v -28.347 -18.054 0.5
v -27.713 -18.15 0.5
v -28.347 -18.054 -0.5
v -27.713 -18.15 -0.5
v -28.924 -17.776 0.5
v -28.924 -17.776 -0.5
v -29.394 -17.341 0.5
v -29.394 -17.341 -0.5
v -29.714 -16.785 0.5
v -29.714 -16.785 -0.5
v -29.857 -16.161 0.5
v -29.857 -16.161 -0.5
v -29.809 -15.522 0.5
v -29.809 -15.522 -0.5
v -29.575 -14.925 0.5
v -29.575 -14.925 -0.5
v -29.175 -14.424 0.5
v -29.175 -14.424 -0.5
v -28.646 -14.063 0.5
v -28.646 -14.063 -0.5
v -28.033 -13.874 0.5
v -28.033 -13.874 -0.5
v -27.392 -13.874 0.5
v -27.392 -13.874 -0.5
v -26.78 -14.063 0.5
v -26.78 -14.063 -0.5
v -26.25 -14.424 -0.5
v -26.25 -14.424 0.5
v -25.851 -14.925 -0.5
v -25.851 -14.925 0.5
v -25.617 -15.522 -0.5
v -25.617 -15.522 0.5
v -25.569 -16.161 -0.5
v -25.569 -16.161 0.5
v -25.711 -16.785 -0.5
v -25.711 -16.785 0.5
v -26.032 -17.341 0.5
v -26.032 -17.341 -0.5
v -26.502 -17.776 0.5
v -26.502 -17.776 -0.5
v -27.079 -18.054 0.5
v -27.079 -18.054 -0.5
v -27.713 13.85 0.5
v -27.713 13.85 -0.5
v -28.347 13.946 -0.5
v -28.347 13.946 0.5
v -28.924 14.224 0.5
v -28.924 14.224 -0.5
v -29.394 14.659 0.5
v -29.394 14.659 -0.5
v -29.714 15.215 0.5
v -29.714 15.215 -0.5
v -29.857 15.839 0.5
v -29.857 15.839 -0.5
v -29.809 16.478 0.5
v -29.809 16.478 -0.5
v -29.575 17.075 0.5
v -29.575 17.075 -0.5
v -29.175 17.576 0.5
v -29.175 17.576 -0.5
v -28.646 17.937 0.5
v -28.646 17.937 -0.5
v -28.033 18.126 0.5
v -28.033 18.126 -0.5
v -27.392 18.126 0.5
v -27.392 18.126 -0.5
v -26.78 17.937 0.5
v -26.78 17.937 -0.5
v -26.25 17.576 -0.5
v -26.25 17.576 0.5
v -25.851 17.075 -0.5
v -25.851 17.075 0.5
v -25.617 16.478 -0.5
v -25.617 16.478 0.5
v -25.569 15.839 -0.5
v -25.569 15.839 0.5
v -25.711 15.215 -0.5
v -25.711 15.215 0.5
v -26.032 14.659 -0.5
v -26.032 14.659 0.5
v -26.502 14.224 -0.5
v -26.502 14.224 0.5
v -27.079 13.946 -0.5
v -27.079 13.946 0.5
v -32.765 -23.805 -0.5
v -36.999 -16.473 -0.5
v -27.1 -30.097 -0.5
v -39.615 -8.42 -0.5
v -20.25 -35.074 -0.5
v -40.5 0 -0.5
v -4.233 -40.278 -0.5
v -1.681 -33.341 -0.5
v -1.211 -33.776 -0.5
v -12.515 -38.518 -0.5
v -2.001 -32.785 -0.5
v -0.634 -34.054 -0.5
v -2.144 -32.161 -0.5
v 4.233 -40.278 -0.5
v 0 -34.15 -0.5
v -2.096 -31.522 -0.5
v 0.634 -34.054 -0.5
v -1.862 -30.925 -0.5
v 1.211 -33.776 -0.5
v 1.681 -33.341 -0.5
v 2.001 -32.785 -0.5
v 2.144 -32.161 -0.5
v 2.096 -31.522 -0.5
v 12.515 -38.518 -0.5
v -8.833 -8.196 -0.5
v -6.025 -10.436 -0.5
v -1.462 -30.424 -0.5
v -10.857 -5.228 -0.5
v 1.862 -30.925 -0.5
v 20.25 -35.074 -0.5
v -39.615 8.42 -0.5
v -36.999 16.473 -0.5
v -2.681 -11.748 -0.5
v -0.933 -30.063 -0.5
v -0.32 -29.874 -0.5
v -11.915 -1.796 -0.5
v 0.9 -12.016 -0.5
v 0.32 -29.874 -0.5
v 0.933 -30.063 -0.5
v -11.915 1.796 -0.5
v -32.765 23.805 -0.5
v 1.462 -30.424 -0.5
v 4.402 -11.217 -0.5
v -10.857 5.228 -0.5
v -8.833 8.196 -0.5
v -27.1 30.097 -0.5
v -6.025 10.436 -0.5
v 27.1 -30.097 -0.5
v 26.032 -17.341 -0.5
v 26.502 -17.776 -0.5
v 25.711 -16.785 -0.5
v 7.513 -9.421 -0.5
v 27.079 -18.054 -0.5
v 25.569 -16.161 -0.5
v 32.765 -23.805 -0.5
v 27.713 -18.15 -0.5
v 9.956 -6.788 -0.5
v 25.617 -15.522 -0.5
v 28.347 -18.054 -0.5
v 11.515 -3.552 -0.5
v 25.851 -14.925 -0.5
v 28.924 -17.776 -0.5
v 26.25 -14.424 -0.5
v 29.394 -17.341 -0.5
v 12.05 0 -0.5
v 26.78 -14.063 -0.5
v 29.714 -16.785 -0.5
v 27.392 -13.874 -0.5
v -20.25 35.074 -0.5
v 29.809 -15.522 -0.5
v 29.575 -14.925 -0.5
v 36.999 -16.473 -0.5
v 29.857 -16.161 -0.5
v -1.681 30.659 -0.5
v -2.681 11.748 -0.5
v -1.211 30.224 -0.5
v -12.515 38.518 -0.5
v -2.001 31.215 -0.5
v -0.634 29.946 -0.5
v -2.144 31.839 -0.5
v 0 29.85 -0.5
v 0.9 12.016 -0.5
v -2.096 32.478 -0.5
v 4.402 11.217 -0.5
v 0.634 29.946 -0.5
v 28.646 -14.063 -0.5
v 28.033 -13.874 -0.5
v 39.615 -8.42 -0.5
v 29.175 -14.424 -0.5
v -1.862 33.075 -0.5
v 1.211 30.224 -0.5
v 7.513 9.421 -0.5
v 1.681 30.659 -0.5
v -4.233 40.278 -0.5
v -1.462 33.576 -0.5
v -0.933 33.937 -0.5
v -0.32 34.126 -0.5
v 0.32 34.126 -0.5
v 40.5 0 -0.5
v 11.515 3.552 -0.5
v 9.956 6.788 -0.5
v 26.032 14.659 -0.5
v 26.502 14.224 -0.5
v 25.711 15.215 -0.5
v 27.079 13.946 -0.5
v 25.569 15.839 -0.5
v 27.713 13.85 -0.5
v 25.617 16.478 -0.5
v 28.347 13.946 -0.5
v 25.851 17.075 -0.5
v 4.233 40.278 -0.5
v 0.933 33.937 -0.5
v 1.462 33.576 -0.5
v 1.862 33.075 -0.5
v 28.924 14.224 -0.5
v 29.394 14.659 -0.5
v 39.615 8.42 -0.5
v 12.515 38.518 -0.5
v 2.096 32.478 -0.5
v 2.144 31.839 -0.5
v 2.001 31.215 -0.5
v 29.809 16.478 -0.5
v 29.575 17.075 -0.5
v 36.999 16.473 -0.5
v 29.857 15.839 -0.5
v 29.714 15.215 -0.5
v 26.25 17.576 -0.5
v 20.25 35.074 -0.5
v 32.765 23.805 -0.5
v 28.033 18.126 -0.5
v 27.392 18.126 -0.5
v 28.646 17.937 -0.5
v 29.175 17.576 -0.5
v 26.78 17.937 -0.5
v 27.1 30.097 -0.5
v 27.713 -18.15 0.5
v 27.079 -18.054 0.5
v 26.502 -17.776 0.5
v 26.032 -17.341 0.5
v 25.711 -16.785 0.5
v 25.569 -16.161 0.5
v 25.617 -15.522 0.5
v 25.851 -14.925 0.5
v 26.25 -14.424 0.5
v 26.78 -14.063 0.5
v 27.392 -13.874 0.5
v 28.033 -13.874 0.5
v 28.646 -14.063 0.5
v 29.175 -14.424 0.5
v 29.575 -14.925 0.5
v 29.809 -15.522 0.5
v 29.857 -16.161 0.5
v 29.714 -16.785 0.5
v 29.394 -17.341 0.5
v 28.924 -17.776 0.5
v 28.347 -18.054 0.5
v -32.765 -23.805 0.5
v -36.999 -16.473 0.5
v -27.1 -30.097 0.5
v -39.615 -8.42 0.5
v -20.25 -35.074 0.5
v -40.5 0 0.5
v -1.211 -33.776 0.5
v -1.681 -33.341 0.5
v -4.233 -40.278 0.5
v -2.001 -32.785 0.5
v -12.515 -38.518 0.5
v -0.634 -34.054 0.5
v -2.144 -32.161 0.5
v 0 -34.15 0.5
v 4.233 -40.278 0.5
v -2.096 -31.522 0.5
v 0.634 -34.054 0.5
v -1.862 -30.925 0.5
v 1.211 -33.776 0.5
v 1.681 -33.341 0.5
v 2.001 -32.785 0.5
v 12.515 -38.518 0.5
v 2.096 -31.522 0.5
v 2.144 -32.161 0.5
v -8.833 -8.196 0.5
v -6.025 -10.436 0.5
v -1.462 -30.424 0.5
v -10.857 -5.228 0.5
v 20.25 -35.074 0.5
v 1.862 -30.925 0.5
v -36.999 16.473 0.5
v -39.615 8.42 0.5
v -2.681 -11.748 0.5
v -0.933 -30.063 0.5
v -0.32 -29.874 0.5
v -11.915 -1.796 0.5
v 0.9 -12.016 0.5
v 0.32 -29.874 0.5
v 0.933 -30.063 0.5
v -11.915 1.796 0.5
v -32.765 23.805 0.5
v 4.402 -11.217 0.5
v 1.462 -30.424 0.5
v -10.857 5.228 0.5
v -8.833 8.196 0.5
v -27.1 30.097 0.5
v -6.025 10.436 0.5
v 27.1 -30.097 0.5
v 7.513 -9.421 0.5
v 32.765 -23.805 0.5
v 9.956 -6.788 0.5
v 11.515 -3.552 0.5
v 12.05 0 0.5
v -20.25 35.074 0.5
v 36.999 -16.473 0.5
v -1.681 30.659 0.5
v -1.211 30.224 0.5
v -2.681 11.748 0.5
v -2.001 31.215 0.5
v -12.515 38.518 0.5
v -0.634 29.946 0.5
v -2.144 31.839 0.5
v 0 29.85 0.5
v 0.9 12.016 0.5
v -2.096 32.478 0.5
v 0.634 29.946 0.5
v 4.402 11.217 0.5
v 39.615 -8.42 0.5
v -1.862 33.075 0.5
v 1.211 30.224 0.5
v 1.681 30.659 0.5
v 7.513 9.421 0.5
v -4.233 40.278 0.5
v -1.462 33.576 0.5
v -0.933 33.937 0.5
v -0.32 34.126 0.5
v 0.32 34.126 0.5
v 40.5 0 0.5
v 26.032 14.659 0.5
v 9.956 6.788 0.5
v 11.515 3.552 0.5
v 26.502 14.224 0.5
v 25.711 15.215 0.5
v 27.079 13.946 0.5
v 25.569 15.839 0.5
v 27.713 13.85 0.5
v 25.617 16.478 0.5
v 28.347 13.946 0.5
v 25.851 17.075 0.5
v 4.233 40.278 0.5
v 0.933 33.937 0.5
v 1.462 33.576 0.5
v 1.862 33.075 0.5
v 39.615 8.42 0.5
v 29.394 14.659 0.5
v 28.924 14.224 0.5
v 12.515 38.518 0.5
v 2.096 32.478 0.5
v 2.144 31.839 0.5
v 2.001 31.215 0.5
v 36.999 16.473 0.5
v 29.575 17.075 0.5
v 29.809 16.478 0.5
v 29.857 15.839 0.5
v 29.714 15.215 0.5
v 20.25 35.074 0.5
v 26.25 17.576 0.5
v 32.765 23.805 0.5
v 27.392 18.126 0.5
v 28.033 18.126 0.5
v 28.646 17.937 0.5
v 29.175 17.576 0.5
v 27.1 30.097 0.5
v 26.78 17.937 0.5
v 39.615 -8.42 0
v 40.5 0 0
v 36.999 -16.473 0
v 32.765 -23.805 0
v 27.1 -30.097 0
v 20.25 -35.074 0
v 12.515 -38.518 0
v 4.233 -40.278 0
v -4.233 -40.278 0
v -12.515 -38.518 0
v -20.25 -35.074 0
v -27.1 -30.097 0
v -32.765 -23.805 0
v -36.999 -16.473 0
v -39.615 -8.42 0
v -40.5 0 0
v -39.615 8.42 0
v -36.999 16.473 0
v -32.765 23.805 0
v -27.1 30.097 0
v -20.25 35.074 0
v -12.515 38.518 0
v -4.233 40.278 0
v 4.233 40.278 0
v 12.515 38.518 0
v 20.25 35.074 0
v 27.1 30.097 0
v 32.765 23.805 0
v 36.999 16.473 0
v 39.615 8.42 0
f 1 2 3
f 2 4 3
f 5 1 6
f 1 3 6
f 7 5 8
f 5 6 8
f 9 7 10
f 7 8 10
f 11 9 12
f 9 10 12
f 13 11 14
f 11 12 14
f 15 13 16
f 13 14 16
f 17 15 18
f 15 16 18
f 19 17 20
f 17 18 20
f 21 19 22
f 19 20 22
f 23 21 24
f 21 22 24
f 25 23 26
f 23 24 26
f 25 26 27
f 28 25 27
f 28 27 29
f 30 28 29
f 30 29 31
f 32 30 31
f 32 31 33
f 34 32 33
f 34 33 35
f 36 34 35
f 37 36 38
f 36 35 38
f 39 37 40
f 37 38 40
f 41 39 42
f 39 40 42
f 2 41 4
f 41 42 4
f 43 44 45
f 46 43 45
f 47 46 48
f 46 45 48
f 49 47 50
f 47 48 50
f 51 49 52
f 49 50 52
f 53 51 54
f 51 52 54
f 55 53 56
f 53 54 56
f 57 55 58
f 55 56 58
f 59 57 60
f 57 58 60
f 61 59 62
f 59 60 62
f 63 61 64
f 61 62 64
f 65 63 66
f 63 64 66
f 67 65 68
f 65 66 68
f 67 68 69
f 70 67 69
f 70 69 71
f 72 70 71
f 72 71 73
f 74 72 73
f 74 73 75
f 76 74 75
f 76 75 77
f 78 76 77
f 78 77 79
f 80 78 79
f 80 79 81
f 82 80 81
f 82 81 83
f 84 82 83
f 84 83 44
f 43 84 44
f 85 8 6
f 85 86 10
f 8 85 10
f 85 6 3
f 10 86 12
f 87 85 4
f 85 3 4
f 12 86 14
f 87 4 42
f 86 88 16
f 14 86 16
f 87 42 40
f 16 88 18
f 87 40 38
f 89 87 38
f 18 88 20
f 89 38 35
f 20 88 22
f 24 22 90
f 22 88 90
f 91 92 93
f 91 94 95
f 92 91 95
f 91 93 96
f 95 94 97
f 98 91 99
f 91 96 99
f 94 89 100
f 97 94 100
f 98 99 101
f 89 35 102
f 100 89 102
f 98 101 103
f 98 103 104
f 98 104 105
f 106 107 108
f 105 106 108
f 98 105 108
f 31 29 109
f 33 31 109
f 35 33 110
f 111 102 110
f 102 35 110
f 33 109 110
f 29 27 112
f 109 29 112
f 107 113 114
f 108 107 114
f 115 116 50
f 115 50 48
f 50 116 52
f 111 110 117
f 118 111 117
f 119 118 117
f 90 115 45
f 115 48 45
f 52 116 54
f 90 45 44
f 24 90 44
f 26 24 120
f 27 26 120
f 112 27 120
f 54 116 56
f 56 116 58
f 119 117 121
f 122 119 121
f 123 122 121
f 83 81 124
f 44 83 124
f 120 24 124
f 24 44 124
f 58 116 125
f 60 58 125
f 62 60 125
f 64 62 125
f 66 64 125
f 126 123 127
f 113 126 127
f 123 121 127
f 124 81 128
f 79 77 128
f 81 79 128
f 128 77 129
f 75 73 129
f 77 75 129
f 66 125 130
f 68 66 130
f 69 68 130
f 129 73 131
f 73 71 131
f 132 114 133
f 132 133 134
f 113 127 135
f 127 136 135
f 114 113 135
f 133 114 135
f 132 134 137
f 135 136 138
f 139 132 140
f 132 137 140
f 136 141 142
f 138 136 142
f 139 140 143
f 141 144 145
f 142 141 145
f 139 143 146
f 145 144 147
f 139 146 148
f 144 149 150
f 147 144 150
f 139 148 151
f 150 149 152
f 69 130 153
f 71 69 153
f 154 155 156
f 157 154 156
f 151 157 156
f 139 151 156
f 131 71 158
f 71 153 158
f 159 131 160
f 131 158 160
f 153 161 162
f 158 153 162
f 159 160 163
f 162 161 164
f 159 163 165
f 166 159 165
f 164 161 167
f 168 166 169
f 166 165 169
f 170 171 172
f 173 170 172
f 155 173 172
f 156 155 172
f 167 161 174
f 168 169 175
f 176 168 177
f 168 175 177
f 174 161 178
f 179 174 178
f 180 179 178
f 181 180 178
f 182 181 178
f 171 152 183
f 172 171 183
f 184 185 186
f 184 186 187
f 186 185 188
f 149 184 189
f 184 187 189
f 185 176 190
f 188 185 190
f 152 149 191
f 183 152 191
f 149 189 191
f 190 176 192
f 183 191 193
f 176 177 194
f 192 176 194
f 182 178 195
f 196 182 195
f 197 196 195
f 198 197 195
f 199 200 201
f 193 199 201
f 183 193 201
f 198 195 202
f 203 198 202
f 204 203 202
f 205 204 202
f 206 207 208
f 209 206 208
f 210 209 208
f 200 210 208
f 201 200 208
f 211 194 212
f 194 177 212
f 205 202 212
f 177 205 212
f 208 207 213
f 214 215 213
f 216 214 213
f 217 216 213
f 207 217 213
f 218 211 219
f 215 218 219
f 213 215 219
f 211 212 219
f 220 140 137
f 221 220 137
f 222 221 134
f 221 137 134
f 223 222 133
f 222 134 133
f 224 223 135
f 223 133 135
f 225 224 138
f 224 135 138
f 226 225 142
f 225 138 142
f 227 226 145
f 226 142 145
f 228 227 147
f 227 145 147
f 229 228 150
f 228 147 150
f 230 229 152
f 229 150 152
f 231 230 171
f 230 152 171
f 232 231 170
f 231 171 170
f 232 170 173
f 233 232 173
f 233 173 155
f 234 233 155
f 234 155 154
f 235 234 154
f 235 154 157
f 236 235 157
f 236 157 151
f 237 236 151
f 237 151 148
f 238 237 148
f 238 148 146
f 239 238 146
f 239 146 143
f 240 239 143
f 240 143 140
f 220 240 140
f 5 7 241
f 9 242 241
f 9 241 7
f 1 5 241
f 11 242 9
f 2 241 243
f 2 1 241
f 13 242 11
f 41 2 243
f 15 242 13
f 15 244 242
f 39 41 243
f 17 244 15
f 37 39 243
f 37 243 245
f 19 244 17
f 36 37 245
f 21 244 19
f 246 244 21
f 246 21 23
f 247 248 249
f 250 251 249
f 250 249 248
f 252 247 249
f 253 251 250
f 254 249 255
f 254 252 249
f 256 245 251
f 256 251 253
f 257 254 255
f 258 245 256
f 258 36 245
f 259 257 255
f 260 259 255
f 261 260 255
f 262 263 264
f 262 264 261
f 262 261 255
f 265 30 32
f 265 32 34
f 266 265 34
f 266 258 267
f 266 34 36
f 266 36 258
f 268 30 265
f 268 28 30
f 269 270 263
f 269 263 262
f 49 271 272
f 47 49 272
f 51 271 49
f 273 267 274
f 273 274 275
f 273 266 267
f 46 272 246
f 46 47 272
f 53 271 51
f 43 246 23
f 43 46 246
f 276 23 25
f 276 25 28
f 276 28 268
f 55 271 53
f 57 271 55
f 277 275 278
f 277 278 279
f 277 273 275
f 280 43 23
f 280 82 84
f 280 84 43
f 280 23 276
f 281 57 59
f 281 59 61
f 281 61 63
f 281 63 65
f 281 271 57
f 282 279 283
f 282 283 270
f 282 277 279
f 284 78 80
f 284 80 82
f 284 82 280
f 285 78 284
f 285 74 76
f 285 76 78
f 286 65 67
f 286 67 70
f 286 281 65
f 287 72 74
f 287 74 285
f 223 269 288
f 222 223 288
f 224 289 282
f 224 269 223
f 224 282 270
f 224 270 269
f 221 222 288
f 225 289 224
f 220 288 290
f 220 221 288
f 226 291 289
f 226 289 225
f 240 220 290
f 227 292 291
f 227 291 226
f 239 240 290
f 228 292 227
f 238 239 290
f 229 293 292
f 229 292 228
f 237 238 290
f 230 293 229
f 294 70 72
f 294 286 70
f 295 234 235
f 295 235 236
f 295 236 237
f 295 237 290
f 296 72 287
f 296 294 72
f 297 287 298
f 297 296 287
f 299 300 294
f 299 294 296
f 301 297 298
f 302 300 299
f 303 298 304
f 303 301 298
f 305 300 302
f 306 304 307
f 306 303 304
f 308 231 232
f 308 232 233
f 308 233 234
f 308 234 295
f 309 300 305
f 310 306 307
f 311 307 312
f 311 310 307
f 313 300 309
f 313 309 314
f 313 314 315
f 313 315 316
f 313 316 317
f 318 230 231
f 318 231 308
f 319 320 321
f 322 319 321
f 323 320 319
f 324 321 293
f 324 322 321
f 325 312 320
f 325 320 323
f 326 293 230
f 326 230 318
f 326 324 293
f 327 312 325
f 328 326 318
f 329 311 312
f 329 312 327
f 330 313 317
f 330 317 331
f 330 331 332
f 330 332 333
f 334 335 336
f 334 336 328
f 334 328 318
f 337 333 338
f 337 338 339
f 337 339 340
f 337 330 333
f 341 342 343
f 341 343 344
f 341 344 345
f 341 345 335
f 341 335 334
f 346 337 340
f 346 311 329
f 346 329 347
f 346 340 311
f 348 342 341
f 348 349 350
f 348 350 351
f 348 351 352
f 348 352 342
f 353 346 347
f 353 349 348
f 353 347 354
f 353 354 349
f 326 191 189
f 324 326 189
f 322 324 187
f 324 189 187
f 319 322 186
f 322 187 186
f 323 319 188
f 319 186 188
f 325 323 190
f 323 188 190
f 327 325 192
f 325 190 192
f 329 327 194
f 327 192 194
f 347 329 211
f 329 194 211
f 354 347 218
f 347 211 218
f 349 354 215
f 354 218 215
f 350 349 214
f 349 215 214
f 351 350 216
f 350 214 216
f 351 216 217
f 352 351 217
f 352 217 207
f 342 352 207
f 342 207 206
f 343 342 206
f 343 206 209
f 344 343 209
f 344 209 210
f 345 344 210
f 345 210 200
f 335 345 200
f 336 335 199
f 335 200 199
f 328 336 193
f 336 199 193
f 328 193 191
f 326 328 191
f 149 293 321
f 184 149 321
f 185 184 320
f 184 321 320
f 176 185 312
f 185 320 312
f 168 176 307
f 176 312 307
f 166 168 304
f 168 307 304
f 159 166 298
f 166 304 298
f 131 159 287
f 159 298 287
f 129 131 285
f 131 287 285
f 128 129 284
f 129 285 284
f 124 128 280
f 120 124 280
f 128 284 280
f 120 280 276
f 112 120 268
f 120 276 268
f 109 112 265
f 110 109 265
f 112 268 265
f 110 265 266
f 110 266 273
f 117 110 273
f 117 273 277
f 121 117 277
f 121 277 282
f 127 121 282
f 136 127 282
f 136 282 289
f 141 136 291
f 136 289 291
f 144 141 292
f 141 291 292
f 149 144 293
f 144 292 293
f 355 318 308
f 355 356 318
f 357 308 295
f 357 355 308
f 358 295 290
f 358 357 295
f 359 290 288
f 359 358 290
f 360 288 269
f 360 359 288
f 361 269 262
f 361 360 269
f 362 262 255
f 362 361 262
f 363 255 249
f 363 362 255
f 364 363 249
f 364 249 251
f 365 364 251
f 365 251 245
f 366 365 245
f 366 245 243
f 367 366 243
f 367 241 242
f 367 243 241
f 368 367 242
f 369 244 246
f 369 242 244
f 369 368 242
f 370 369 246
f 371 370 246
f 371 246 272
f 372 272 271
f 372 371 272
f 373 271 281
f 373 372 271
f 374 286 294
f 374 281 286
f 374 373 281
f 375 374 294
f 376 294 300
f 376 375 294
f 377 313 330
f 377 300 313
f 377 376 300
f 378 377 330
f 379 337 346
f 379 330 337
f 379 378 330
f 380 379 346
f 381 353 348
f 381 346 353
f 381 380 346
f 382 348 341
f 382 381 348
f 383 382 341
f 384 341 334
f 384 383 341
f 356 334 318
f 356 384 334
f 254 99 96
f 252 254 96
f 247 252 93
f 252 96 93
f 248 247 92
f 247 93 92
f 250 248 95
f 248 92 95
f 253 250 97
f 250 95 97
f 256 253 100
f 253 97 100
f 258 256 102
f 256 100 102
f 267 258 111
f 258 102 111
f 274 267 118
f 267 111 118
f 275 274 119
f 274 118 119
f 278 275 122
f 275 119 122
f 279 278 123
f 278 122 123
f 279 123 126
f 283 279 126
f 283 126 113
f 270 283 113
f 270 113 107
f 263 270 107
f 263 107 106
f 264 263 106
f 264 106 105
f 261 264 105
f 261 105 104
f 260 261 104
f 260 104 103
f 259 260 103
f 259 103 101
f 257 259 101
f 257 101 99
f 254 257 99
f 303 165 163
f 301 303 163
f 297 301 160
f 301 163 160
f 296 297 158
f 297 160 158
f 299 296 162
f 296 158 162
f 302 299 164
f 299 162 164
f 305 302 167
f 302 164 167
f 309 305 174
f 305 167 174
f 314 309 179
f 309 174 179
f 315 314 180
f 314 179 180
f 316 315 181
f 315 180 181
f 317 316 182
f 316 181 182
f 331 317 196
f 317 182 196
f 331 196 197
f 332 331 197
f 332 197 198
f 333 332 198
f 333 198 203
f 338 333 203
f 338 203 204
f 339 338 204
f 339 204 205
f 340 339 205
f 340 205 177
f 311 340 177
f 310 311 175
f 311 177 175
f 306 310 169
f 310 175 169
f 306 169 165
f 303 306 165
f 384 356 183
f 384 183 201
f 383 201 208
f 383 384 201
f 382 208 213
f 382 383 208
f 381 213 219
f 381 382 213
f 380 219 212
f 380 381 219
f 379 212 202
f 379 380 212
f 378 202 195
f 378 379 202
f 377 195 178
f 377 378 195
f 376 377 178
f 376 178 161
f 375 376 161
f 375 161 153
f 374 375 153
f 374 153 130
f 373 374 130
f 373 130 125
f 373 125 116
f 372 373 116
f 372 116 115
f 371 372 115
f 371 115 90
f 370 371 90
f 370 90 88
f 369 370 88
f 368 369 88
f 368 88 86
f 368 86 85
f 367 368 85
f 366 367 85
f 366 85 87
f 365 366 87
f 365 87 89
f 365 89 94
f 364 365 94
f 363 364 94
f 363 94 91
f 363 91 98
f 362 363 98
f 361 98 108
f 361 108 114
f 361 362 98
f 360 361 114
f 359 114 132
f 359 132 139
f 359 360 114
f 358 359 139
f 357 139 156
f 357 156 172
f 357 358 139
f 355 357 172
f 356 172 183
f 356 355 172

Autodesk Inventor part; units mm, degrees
ref_plane "YZ Plane" through (0, 0, 0) normal (1, 0, 0) x (0, 1, 0)
ref_plane "XZ Plane" through (0, 0, 0) normal (0, 1, 0) x (-1, 0, 0)
ref_plane "XY Plane" through (0, 0, 0) normal (0, 0, 1) x (1, 0, 0)
sketch "スケッチ1" plane through (0, 0, 0) normal (0, 0, 1) x (1, 0, 0)
  circle A0 centre (0, 0) radius 40.5
  dimension "d0" = 81
extrude "プレート1" add sketch "スケッチ1" along normal mid plane 1
sketch "スケッチ2" plane through (0, 0, 0.5) normal (0, 0, 1) x (1, 0, 0)
  circle A0 centre (0, 0) radius 12.05
  dimension "d2" = 24.1
extrude "押し出し1" cut sketch "スケッチ2" against normal blind 10
sketch "スケッチ3" plane through (0, 0, 0.5) normal (0, 0, 1) x (1, 0, 0)
  circle A0 centre (0, 0) radius 32
  point P0 (0, 32)
  point P1 (-27.7128, 16)
  point P2 (-27.7128, -16)
  point P3 (0, -32)
  point P4 (27.7128, -16)
  point P5 (27.7128, 16)
  dimension "d5" = 64
  dimension "d8" = 360
hole "穴1" at (0, 32, 0.5) at (-27.7128, 16, 0.5) at (-27.7128, -16, 0.5) at (0, -32, 0.5) at (27.7128, -16, 0.5) at (27.7128, 16, 0.5) direction (0, 0, -1) diameter 4.3 end through all clearance for "Flat Head Machine Screw" size "M4" standard "Ansi Metric M Profile"
equation "\"d15\" = Thickness"
equation "\"d1\" = Thickness"
equation "\"BendRadius\" = Thickness"
equation "\"BendReliefWidth\" = Thickness"
equation "\"BendReliefDepth\" = 0.5 * Thickness"
equation "\"CornerReliefSize\" = 4 * Thickness"
equation "\"MinimumRemnant\" = 2 * Thickness"
equation "\"TransitionRadius\" = BendRadius"
equation "\"JacobiRadiusSize\" = BendRadius"
equation "\"GapSize\" = Thickness"
equation "\"Thickness\" = 1"
properties part number "unit-plate1" material "CFRP"
